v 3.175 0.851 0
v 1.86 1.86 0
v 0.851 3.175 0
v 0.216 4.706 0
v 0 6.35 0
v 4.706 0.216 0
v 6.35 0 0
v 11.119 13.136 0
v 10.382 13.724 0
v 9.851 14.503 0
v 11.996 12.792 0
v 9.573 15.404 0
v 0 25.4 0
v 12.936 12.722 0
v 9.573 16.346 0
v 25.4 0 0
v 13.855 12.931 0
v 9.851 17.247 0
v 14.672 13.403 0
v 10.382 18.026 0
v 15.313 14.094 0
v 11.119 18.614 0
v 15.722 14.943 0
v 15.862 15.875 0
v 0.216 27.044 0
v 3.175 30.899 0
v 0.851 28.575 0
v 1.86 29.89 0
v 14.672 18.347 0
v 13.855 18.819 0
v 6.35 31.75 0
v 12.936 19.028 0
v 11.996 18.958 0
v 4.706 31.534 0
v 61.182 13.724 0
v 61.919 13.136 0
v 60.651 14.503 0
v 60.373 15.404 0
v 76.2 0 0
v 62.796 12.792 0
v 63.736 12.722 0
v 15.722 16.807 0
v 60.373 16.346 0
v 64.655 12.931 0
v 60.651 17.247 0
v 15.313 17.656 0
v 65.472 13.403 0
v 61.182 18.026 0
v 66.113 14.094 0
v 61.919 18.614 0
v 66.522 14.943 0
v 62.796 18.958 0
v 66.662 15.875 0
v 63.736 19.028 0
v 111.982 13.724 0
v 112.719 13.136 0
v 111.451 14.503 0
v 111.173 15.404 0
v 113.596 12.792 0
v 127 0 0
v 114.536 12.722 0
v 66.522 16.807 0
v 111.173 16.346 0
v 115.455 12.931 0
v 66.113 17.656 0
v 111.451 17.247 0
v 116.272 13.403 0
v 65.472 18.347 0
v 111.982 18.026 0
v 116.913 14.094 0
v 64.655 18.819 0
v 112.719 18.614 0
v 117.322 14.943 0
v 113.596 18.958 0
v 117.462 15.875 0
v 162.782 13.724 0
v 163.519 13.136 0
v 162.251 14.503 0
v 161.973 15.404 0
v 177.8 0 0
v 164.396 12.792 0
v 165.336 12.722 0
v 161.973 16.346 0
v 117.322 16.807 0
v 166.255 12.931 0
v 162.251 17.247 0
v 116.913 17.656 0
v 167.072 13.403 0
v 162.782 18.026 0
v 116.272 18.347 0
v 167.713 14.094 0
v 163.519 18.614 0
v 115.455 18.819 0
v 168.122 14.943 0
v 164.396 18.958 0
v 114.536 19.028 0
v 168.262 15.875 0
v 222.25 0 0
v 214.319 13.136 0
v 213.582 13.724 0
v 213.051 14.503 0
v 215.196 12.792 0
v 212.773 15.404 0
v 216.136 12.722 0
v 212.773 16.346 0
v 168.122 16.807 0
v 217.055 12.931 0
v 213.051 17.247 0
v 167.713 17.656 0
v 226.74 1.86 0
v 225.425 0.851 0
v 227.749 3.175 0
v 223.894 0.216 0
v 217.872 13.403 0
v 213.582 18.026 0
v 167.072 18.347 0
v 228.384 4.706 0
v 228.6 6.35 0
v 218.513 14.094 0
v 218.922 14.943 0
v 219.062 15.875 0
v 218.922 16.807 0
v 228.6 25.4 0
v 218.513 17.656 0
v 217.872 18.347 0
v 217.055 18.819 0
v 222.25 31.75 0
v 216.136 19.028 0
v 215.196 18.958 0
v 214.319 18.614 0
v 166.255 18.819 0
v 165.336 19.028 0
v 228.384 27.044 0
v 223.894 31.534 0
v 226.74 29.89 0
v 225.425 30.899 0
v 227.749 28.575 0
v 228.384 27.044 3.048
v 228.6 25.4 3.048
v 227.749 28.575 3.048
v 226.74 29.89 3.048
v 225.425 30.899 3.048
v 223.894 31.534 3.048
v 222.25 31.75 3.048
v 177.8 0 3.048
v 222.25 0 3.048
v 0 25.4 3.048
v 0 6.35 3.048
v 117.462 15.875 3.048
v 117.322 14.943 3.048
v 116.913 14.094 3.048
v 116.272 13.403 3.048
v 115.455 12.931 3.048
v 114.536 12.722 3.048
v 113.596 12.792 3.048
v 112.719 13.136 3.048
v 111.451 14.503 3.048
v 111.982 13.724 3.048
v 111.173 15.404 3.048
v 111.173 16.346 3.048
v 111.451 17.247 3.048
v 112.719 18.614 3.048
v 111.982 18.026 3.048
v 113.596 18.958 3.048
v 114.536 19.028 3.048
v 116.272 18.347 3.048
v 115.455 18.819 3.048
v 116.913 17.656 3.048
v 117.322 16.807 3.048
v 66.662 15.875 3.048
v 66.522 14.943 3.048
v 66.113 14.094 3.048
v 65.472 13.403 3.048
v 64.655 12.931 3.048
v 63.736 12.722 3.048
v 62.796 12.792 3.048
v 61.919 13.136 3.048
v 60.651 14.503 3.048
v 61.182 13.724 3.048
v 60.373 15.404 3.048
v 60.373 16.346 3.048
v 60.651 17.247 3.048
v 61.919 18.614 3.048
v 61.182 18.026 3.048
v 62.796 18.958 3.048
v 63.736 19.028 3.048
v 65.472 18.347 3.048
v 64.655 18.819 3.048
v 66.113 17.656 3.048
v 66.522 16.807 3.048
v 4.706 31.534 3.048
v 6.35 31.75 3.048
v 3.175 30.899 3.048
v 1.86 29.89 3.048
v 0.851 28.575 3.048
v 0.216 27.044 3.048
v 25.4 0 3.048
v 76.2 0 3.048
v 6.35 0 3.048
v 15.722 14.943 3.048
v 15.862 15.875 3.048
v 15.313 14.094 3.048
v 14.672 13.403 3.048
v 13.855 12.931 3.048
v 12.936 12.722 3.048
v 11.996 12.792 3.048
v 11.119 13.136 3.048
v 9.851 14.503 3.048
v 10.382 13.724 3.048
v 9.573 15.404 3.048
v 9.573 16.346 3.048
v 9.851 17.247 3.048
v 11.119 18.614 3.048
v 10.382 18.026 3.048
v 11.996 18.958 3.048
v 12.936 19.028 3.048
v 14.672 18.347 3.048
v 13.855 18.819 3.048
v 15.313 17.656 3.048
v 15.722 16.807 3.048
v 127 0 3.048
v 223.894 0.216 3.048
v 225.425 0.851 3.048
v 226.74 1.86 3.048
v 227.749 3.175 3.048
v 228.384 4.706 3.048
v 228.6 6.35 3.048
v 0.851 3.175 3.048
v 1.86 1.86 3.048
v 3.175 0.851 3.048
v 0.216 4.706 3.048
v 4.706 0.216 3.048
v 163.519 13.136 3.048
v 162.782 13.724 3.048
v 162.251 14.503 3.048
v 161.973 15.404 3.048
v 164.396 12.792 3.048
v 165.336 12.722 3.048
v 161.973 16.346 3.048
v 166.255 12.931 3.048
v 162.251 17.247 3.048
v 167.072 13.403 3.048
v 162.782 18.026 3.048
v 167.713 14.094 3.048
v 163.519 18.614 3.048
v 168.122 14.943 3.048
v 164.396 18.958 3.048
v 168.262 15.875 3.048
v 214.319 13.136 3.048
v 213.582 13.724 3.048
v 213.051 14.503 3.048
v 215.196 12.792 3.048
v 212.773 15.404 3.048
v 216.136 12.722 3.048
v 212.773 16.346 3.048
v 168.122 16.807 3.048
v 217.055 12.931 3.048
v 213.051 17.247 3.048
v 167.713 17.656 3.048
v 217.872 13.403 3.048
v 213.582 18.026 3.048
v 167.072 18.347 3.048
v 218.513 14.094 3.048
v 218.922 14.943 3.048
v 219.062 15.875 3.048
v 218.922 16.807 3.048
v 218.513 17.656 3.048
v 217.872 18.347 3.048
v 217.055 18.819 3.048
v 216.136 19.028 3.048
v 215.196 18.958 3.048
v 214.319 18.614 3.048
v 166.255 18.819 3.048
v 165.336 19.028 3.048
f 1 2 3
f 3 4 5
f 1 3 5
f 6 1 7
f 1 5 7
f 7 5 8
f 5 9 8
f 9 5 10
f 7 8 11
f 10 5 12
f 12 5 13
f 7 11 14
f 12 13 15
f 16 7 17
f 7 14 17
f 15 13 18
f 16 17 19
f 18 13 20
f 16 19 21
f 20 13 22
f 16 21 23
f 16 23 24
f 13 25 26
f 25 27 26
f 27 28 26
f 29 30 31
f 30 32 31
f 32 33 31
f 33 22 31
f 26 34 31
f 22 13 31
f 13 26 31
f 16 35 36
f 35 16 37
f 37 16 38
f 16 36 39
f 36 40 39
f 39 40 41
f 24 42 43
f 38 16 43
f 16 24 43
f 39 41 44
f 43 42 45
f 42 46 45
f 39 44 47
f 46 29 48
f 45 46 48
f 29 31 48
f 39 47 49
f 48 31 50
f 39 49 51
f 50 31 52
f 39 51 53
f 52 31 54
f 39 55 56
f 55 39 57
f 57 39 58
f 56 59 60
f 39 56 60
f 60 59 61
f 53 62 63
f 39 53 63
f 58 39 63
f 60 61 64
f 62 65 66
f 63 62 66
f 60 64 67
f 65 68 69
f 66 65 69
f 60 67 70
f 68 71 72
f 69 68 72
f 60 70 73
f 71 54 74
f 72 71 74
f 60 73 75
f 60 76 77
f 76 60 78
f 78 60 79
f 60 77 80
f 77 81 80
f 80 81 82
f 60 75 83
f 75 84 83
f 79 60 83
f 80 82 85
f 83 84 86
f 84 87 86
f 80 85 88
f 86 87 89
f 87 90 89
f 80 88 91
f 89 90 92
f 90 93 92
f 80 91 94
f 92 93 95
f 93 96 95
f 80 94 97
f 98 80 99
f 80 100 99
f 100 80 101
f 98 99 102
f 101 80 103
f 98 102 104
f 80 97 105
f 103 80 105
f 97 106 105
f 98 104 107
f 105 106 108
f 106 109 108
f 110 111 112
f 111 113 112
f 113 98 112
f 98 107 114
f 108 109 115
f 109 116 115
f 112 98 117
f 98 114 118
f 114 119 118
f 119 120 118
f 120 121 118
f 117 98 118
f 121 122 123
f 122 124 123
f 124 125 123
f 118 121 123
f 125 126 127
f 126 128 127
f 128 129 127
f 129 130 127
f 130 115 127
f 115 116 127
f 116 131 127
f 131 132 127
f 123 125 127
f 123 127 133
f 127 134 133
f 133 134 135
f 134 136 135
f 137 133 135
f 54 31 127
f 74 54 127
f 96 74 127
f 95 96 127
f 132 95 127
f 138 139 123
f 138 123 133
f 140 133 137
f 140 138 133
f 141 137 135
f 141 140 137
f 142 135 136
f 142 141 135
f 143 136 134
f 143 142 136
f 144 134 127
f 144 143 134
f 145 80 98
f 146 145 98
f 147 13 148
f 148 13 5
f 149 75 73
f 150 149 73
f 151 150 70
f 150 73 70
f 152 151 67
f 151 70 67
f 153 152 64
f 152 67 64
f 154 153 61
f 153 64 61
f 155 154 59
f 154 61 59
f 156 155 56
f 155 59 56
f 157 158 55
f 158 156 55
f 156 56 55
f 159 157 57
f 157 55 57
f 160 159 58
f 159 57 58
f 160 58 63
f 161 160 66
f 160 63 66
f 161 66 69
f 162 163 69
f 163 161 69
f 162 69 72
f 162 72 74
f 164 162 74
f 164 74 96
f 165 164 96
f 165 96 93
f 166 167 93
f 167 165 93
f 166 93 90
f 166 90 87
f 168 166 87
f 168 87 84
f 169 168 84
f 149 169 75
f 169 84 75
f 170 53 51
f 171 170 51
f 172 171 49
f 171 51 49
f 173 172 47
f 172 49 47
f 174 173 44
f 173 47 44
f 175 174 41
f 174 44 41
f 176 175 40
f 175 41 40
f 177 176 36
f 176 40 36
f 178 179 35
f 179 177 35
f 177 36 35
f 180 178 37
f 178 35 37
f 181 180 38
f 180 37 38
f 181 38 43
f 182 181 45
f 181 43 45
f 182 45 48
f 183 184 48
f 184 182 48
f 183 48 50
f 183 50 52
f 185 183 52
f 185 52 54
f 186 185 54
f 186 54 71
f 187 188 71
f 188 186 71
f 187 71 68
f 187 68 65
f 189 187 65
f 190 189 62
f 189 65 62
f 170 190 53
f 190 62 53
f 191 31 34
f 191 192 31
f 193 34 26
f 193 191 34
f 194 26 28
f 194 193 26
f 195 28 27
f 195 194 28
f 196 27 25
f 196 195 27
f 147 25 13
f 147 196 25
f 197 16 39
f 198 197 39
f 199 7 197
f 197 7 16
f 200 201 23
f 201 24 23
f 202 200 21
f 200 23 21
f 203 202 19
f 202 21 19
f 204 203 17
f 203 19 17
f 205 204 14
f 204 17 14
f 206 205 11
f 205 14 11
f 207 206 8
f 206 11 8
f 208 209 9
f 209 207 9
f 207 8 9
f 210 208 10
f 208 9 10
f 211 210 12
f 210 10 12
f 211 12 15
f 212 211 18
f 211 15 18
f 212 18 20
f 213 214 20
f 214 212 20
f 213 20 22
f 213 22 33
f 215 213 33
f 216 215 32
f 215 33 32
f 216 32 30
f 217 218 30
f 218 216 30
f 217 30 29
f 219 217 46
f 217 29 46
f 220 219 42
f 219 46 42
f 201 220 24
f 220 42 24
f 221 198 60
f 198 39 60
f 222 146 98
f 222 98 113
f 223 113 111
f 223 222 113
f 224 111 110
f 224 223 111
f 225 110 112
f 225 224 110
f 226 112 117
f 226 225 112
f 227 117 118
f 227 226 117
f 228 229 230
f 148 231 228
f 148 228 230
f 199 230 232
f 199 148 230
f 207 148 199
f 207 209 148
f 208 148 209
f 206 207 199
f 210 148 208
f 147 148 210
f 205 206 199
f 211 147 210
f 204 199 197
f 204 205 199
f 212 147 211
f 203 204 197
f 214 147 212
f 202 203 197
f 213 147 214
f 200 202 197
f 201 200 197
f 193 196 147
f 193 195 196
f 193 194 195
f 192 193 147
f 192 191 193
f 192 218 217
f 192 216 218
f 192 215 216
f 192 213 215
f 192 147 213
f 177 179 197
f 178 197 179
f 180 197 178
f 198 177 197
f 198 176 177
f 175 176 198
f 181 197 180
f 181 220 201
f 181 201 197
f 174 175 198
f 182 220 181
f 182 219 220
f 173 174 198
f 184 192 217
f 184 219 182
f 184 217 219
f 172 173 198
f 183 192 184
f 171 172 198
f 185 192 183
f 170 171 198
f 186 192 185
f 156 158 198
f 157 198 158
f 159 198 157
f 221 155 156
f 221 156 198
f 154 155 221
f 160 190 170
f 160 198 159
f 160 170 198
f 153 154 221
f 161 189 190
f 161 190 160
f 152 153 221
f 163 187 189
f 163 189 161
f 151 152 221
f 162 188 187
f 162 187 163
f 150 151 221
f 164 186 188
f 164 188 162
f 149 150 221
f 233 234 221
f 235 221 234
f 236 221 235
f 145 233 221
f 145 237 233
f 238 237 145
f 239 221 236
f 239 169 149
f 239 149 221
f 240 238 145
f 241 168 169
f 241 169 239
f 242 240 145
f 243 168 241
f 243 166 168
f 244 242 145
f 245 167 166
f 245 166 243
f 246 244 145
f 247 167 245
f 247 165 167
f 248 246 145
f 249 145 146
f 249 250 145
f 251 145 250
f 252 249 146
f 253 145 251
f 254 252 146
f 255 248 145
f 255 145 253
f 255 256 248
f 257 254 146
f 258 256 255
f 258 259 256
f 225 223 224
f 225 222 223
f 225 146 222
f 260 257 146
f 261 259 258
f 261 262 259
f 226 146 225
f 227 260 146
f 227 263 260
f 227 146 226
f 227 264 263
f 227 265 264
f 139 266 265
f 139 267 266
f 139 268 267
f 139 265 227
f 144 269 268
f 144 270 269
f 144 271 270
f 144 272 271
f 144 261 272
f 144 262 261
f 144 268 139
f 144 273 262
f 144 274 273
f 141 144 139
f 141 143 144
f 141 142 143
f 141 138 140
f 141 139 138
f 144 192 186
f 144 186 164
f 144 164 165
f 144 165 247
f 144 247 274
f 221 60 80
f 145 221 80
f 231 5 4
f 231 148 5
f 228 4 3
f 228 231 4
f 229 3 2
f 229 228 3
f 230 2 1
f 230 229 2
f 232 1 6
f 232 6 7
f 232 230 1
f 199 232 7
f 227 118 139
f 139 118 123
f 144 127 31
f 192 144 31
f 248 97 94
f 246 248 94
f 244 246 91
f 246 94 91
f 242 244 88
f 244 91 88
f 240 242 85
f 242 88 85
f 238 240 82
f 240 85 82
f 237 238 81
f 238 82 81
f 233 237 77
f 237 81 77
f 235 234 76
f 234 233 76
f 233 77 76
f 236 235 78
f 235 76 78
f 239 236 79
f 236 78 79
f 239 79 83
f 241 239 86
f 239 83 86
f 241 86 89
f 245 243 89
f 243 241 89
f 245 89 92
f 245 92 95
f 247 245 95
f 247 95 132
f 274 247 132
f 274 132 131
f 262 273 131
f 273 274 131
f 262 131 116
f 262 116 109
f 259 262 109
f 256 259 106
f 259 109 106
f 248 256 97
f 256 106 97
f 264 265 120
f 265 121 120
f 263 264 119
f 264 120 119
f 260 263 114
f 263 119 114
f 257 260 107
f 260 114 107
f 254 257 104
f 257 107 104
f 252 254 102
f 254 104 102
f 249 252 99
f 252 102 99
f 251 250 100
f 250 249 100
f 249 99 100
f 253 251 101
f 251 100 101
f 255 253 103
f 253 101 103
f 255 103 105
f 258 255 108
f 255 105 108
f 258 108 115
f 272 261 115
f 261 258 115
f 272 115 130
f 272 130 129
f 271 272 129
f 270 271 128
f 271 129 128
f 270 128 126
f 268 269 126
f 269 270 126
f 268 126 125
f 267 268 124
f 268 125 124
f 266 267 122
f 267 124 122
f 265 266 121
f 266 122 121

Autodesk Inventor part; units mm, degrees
ref_plane "YZ Plane" through (0, 0, 0) normal (1, 0, 0) x (0, 1, 0)
ref_plane "XZ Plane" through (0, 0, 0) normal (0, 1, 0) x (-1, 0, 0)
ref_plane "XY Plane" through (0, 0, 0) normal (0, 0, 1) x (1, 0, 0)
sketch "Sketch1" plane through (0, 0, 0) normal (0, 0, 1) x (1, 0, 0)
  line L0 (0, 0) -> (228.6, 0)
  line L1 (228.6, 0) -> (228.6, 31.75)
  line L2 (228.6, 31.75) -> (0, 31.75)
  line L3 (0, 31.75) -> (0, 0)
  circle A0 centre (215.9, 15.875) radius 3.1623
  line L4 (-50.8, 0) -> (177.8, 0)
  circle A1 centre (165.1, 15.875) radius 3.1623
  line L5 (-101.6, 0) -> (127, 0)
  circle A2 centre (114.3, 15.875) radius 3.1623
  line L6 (-152.4, 0) -> (76.2, 0)
  circle A3 centre (63.5, 15.875) radius 3.1623
  line L7 (-203.2, 0) -> (25.4, 0)
  circle A4 centre (12.7, 15.875) radius 3.1623
  dimension "d0" = 228.6
  dimension "d1" = 31.75
  dimension "d2" = 6.3246
  dimension "d3" = 12.7
  dimension "d4" = 15.875
  dimension "d7" = 50.8
extrude "Plate1" add sketch "Sketch1" along normal blind 3.048
fillet "Corner Round1" radius 6.35 4 edges at (228.6, 31.75, 1.524) (228.6, 0, 1.524) (0, 31.75, 1.524) (0, 0, 1.524)
equation "\"BendRadius\" = Thickness"
equation "\"BendReliefWidth\" = Thickness"
equation "\"BendReliefDepth\" = 0.5 * Thickness"
equation "\"CornerReliefSize\" = 4 * Thickness"
equation "\"MinimumRemnant\" = 2 * Thickness"
equation "\"TransitionRadius\" = BendRadius"
equation "\"JacobiRadiusSize\" = BendRadius"
equation "\"GapSize\" = Thickness"
equation "\"d12\" = BendRadius"
equation "\"Thickness\" = 3.048"
properties part number "super3"
